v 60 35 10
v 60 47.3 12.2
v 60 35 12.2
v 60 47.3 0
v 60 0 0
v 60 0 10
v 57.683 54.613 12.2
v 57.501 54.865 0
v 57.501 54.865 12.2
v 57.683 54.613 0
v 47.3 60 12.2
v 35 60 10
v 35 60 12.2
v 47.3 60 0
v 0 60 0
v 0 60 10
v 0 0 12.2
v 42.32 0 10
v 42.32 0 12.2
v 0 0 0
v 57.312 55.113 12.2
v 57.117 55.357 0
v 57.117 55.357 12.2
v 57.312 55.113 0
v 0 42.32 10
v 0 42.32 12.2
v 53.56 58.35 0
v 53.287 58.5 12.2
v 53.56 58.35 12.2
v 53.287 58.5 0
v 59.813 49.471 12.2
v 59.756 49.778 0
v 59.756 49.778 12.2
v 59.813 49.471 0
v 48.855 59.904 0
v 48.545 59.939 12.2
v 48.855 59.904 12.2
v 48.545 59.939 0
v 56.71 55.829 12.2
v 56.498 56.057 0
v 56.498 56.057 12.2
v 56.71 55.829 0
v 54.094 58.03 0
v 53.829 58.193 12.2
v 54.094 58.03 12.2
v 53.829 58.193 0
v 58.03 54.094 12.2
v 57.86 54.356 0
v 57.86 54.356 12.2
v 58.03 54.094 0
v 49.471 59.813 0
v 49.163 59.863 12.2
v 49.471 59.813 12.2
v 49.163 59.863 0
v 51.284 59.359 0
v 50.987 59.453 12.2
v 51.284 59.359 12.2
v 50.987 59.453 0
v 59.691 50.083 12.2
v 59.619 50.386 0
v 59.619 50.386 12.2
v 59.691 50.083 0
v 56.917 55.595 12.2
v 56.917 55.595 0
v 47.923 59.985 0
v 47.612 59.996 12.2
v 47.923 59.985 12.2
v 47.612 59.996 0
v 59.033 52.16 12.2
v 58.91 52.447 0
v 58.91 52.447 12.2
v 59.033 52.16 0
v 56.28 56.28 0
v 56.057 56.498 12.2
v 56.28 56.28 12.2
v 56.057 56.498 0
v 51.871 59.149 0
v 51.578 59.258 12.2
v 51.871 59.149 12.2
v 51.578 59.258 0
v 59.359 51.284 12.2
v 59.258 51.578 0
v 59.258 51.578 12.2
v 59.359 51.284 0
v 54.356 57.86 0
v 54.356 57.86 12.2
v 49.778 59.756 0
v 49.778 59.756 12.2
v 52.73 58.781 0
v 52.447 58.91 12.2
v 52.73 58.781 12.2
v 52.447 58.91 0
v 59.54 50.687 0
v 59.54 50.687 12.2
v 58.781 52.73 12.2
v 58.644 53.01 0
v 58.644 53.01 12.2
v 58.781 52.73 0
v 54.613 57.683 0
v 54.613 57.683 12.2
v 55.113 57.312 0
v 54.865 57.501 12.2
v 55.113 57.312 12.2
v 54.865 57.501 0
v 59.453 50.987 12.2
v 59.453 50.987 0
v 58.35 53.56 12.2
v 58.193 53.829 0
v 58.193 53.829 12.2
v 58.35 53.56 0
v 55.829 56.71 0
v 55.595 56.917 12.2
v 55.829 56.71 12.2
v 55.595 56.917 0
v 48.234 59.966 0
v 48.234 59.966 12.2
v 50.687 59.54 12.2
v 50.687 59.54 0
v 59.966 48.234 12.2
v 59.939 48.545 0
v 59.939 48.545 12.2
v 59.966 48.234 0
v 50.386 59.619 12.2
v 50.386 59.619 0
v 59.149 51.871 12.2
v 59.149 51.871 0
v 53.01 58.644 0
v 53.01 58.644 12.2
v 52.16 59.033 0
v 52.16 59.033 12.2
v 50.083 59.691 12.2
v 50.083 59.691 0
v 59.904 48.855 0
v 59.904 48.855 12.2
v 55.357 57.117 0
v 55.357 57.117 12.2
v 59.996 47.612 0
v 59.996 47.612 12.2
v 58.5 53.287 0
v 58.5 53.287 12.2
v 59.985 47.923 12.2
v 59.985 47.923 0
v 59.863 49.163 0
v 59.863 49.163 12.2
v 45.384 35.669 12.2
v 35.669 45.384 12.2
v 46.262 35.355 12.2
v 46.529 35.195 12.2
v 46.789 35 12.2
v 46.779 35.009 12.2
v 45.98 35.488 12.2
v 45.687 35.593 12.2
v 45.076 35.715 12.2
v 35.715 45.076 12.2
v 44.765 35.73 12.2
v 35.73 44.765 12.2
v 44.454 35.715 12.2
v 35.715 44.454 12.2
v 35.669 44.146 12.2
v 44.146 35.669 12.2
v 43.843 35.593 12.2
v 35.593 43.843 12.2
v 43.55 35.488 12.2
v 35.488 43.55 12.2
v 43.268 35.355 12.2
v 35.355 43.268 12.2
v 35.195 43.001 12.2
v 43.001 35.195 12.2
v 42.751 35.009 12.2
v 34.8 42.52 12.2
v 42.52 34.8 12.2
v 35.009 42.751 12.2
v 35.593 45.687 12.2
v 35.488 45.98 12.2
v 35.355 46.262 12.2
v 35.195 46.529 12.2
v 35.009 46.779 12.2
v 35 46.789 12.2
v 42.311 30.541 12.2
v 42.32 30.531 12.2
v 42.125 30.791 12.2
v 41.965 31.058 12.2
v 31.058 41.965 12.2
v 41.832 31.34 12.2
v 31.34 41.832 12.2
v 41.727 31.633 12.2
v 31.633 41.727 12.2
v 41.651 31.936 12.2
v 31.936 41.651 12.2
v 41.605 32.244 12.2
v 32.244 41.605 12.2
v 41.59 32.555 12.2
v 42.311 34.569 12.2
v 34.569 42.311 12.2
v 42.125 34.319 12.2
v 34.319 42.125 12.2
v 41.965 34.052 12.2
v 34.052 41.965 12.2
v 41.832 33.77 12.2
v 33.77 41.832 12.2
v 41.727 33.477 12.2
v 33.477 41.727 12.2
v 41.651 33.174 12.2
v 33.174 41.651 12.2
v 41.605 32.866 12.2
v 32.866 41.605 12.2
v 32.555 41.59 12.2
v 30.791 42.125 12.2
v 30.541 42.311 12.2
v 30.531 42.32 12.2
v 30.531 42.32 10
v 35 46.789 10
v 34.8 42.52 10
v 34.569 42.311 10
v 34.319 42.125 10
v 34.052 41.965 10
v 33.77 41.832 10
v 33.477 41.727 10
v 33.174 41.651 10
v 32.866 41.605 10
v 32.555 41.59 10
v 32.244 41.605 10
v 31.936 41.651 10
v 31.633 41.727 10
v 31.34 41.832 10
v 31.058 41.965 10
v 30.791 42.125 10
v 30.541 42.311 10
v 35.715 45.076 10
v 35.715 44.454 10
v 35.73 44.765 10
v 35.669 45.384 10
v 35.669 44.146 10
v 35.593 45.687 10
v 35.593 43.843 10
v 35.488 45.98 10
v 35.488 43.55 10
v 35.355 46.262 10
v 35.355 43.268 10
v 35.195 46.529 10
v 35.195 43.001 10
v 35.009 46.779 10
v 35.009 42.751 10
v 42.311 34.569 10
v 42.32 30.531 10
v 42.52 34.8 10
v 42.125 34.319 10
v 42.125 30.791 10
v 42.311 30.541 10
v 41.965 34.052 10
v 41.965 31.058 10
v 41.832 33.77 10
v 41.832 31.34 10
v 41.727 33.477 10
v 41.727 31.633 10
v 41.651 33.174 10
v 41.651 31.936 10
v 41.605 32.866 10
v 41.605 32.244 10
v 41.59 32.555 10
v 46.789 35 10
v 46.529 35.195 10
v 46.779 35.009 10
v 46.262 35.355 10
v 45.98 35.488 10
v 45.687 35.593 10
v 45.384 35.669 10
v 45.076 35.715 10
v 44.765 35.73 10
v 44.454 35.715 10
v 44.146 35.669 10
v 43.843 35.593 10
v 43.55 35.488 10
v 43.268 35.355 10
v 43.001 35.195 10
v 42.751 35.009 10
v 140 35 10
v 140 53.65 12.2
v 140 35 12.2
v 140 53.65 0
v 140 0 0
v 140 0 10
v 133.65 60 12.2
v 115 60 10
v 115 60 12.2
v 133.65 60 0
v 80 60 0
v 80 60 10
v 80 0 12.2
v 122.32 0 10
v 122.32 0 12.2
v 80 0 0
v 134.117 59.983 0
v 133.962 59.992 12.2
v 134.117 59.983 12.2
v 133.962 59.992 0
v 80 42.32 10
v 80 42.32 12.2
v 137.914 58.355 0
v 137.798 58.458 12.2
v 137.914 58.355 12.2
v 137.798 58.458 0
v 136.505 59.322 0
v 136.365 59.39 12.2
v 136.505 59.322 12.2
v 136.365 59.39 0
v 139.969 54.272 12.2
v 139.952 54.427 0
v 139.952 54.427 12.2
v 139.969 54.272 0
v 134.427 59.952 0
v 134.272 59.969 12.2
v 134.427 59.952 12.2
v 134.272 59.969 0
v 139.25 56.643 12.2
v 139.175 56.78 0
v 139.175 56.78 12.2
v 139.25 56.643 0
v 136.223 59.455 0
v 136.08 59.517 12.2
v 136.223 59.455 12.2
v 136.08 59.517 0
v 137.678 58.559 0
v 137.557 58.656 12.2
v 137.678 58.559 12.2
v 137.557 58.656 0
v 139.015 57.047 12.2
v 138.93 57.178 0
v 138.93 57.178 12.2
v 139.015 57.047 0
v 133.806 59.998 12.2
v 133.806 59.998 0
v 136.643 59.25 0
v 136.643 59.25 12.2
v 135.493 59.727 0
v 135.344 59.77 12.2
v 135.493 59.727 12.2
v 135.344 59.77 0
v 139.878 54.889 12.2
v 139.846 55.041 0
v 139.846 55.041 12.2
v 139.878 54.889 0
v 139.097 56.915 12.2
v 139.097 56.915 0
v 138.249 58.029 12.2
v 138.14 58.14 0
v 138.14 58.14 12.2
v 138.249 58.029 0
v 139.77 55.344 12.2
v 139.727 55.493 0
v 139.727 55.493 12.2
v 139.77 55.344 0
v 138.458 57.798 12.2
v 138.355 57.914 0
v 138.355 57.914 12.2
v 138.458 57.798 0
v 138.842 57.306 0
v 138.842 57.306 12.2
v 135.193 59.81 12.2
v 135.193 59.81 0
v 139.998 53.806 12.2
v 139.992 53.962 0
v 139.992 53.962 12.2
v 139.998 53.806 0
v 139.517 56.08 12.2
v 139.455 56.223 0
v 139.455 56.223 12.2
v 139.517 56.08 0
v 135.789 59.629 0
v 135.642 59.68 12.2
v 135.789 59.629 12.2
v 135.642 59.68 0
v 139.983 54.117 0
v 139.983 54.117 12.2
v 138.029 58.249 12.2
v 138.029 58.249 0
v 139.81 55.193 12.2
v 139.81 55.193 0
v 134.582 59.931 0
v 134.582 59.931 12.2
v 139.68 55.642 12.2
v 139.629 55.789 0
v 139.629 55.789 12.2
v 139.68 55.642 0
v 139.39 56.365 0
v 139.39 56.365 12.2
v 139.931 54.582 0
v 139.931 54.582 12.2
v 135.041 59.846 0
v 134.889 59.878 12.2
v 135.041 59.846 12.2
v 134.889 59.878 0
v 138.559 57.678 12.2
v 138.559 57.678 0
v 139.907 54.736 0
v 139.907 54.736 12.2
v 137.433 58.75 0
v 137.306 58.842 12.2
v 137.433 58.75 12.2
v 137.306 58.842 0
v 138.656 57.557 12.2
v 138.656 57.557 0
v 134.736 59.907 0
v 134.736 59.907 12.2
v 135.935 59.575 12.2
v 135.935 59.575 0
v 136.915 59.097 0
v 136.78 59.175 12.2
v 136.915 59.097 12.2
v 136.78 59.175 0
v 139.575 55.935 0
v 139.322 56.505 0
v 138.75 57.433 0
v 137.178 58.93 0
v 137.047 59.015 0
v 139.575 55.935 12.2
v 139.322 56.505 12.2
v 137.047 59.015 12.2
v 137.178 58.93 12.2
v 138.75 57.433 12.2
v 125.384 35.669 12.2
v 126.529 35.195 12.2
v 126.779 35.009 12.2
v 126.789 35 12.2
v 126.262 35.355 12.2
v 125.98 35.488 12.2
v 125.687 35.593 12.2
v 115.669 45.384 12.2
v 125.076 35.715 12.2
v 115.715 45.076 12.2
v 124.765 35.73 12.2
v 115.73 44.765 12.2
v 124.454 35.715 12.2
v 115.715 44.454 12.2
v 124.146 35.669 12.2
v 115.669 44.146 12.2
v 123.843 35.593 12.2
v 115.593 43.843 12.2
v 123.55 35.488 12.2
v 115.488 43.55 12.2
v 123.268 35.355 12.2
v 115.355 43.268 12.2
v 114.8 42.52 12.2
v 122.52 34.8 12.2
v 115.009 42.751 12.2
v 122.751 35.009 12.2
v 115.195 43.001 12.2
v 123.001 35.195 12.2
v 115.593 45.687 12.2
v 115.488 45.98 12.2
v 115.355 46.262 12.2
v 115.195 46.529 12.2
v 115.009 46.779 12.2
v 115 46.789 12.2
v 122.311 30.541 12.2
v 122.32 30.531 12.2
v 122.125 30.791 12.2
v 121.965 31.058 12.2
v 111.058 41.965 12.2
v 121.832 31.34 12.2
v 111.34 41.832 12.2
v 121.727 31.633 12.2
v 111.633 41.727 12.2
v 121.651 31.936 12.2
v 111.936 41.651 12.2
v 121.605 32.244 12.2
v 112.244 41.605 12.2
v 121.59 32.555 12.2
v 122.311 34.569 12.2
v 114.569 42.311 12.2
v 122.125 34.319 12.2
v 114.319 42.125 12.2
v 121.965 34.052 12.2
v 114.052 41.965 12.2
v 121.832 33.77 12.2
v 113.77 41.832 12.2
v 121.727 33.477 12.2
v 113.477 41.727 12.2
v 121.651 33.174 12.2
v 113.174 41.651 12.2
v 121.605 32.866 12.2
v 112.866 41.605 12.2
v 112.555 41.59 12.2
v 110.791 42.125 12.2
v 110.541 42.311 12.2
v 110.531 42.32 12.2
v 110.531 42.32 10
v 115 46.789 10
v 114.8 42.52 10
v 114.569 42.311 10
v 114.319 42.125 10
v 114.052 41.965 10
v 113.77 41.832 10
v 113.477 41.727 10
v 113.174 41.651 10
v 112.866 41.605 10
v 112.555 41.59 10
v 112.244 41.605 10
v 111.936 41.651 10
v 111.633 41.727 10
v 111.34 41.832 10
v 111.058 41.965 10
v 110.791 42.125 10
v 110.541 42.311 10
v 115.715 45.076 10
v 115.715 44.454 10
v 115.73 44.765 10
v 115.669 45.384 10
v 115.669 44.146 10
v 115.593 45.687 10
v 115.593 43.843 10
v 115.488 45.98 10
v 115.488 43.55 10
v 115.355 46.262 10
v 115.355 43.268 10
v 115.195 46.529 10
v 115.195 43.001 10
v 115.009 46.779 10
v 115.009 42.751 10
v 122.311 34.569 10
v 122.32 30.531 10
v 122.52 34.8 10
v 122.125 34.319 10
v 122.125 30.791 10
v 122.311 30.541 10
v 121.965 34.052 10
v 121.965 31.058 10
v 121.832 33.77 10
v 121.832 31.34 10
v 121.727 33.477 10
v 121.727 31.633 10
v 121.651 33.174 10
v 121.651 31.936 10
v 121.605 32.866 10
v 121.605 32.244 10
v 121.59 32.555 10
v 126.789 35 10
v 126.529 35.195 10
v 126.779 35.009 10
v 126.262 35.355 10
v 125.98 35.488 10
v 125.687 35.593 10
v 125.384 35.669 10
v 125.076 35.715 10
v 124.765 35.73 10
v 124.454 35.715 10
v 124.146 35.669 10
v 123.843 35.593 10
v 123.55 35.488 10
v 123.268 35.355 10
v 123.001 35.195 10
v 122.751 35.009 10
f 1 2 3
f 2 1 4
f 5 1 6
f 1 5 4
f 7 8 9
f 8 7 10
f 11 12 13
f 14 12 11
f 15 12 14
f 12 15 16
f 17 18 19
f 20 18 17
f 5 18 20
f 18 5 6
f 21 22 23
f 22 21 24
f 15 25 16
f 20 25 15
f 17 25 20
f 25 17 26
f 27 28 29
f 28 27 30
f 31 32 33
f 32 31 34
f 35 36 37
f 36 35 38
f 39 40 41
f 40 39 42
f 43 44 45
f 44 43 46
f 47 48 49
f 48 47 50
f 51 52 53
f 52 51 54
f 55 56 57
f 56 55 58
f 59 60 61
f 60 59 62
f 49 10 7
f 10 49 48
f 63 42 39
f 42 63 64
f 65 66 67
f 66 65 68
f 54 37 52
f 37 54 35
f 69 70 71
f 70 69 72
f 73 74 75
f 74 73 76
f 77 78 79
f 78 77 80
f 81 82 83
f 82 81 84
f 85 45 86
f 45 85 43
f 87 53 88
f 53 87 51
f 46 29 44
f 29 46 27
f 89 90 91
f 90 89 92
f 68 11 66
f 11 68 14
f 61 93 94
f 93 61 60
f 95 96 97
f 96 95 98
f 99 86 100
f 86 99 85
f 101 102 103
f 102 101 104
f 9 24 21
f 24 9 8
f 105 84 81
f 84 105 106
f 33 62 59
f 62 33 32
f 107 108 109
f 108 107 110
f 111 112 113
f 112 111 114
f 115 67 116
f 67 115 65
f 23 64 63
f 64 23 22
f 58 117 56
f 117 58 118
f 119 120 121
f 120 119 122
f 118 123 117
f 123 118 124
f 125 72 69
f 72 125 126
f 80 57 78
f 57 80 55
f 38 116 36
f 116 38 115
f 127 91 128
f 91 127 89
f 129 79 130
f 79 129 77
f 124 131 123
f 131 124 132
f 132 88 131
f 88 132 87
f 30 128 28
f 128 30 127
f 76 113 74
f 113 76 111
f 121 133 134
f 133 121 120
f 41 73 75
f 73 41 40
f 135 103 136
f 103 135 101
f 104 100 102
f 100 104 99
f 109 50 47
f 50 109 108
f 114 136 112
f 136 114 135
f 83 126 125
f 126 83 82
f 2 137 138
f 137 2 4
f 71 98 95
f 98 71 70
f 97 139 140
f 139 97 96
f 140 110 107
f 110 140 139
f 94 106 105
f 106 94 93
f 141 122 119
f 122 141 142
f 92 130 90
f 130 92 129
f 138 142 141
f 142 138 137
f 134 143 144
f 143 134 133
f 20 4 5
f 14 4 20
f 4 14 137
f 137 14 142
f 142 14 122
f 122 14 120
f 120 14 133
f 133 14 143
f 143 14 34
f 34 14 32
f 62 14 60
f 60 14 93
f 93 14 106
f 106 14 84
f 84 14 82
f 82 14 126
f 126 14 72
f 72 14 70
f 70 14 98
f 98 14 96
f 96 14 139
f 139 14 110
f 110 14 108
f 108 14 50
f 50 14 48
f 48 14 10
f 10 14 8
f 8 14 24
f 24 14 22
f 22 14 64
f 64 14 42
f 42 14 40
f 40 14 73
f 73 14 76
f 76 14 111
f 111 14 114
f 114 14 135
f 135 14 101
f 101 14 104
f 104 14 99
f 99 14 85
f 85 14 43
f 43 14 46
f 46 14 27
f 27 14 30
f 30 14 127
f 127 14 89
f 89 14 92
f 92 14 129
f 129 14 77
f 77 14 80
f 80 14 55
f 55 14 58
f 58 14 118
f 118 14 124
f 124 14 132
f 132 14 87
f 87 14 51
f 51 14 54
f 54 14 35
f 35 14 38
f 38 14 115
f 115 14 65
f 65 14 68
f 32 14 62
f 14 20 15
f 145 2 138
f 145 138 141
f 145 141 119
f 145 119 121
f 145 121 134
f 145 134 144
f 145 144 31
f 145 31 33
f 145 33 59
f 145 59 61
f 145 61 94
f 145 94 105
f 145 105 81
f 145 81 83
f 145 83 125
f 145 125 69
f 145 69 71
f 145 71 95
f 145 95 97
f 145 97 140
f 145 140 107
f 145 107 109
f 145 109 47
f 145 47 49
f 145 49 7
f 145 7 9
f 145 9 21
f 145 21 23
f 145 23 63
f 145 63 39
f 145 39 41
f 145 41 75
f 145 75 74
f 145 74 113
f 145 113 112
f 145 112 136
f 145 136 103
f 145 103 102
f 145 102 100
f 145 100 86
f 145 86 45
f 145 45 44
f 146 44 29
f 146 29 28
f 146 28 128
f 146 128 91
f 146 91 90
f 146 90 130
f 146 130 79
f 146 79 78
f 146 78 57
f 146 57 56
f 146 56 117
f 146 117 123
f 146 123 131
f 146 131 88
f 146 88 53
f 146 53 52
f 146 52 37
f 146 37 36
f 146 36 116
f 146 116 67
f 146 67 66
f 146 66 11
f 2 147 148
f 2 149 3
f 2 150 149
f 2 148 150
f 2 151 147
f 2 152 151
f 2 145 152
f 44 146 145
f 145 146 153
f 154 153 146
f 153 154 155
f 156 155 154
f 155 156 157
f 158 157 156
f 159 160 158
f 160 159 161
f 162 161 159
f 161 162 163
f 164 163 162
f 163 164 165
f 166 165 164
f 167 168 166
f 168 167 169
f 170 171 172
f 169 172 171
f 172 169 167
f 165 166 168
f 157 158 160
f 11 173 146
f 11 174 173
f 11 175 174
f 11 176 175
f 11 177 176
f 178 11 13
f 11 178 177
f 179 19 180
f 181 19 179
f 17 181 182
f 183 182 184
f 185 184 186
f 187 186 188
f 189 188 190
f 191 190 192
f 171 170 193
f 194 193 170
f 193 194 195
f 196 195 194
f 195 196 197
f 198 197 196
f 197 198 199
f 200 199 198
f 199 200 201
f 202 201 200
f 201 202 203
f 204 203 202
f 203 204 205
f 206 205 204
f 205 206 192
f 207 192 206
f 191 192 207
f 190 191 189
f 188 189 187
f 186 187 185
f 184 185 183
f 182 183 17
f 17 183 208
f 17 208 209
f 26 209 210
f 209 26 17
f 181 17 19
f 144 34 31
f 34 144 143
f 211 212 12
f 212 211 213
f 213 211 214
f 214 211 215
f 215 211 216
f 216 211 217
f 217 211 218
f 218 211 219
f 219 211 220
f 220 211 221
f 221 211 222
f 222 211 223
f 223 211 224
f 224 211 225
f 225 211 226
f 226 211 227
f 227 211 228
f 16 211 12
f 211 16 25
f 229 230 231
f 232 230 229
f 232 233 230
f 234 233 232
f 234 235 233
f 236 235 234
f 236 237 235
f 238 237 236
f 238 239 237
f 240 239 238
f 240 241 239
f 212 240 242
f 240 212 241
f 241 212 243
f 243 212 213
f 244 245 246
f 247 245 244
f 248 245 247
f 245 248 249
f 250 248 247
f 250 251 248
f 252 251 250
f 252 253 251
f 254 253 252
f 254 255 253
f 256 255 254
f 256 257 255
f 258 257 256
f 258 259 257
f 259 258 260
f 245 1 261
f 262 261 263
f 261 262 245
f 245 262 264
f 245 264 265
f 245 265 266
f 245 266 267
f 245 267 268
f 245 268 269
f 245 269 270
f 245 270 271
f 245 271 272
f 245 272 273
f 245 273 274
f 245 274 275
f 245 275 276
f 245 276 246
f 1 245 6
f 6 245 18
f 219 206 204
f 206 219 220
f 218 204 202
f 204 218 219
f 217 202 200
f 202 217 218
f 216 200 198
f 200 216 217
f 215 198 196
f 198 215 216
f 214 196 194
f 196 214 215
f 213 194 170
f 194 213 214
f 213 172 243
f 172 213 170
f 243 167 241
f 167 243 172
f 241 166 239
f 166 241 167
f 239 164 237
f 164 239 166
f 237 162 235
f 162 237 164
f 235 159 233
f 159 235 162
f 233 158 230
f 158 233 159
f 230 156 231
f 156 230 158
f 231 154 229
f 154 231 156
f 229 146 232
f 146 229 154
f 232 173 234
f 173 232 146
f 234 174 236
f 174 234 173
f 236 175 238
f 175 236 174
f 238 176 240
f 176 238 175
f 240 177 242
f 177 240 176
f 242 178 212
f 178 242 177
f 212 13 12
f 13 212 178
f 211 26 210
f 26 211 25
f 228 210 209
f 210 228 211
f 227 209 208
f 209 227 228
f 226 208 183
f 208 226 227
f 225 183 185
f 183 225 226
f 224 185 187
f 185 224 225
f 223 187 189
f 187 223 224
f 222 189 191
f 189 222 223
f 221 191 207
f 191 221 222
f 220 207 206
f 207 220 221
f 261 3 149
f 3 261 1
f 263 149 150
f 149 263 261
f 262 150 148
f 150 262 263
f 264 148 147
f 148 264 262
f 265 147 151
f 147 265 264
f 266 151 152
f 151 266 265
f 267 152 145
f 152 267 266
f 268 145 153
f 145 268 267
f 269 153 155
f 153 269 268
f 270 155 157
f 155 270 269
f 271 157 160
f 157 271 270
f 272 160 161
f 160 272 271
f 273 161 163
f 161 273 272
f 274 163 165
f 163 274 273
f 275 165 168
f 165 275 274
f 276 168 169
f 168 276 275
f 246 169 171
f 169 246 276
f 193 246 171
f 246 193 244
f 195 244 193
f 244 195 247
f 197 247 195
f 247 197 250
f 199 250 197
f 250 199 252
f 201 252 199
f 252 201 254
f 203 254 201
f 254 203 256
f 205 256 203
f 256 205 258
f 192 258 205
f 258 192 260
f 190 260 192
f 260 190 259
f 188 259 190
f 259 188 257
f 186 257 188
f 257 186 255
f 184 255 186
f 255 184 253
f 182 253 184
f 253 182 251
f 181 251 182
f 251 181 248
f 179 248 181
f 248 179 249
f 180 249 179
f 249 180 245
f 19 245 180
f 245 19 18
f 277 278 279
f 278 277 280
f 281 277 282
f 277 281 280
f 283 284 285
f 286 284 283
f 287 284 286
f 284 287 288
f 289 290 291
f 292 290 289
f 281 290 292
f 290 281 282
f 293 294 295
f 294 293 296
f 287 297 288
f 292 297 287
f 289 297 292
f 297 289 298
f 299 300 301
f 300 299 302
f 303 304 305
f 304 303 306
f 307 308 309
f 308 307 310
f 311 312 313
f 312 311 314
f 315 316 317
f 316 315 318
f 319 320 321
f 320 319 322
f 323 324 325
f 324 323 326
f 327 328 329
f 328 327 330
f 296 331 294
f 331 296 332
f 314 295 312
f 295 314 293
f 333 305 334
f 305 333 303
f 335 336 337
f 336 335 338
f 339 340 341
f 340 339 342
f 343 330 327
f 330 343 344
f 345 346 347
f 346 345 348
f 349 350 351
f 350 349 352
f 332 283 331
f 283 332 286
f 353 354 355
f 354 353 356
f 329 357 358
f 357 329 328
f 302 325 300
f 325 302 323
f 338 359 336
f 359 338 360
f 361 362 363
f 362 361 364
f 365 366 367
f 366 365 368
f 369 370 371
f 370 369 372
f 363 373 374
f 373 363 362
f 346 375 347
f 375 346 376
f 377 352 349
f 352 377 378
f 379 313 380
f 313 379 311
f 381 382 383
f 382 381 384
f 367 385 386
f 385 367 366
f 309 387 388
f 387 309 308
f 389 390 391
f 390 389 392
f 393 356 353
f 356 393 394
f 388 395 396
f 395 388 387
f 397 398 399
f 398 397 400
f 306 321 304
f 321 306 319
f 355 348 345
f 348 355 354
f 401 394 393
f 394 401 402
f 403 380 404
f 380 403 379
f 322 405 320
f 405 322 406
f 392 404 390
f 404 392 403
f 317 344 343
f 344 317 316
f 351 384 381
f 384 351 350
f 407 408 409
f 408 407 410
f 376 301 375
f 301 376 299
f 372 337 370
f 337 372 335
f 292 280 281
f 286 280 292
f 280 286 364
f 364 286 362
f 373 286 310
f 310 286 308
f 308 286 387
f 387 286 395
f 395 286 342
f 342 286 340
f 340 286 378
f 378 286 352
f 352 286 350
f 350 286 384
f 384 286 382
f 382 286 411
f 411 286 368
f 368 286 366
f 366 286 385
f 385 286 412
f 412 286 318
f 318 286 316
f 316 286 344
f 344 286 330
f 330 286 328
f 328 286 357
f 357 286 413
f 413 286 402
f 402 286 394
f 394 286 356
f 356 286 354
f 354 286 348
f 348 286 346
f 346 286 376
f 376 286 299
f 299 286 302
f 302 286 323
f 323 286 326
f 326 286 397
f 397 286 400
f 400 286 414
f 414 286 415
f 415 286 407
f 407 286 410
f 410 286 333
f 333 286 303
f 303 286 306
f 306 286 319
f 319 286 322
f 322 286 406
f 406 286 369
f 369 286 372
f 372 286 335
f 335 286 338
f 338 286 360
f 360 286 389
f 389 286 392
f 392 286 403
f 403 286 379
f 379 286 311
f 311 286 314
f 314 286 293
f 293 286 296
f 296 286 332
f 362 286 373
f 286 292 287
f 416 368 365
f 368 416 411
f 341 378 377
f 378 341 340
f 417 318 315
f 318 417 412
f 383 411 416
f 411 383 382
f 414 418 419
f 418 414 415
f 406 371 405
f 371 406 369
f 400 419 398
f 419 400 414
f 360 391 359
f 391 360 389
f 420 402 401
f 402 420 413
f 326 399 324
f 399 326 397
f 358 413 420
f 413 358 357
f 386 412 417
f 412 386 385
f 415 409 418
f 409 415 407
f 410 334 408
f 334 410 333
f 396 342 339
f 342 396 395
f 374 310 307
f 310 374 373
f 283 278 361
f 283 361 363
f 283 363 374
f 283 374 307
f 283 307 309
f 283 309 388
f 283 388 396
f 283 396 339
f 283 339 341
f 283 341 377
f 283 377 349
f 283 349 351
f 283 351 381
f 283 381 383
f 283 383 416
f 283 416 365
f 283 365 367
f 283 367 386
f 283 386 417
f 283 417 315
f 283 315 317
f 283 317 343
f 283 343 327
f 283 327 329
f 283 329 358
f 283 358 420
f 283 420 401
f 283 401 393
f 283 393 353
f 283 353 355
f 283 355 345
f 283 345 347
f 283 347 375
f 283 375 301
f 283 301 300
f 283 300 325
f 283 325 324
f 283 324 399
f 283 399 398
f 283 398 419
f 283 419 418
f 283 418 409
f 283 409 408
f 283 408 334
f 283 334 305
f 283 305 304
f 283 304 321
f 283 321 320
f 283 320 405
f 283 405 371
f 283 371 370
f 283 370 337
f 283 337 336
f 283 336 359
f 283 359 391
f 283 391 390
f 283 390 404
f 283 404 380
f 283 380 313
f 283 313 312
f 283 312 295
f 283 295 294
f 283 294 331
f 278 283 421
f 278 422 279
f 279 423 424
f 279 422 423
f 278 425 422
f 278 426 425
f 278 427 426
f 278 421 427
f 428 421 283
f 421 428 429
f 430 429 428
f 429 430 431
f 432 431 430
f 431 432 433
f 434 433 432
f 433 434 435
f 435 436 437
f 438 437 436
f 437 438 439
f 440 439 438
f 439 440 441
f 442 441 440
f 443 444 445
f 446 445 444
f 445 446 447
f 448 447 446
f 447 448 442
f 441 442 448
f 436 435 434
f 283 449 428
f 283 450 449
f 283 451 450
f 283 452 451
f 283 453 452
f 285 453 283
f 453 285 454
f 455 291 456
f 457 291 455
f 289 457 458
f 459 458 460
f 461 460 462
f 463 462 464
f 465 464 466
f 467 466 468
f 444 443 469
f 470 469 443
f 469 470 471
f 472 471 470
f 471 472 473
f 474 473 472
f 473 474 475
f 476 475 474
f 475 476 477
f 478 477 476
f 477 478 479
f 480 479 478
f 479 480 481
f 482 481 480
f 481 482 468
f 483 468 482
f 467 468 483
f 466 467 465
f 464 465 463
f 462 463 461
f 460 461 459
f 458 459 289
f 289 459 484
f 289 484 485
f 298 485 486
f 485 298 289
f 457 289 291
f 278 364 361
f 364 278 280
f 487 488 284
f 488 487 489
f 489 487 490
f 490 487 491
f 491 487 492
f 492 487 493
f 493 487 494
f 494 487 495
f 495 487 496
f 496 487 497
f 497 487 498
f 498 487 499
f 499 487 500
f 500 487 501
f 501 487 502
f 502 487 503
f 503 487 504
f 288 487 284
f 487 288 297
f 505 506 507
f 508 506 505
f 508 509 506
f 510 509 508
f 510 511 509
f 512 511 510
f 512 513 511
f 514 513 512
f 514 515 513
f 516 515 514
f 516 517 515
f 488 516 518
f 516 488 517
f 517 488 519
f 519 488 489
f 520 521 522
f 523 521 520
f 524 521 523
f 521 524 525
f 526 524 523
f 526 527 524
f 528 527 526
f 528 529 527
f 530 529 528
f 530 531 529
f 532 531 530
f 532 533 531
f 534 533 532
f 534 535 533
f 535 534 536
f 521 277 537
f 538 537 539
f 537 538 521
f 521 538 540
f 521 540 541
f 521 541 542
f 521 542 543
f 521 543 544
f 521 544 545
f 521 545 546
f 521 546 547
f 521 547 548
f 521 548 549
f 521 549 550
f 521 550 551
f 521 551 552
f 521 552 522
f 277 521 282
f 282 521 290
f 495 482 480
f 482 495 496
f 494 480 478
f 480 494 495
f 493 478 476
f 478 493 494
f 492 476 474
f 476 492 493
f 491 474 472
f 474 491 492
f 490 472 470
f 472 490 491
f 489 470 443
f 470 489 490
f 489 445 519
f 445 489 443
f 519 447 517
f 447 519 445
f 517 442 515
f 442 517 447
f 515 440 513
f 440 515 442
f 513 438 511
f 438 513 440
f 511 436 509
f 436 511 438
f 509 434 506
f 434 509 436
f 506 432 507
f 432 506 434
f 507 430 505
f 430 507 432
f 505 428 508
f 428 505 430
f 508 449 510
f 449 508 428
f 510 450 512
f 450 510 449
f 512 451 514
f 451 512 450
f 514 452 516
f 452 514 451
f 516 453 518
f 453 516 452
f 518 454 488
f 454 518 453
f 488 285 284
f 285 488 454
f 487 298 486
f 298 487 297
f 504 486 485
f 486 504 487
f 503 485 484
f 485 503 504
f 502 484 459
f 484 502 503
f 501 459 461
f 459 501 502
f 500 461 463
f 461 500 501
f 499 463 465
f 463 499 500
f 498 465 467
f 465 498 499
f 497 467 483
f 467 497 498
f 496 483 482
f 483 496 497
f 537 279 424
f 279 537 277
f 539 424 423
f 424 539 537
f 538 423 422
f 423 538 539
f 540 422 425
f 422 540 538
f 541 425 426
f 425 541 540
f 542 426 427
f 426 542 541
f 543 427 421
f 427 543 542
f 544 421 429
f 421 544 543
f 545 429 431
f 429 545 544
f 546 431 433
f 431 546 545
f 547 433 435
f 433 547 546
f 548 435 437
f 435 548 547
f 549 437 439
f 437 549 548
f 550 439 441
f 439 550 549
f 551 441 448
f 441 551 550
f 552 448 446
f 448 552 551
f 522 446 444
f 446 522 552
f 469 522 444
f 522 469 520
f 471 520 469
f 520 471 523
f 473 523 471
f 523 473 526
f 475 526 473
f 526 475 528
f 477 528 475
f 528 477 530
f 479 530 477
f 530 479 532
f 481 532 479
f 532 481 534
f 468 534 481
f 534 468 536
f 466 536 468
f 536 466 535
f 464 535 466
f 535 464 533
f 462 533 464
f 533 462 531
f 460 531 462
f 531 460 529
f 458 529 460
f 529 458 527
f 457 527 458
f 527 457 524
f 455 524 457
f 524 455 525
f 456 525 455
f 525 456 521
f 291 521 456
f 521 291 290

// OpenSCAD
// file: ../../_lib/edge_tabs.scad
include <fillets.scad>;

LEFT_EDGE = 1;
RIGHT_EDGE = 2;
TAB = 3;  // tab defined by left edge and width
CTAB = 4; // tab defined by center and width

// Sample tabs are [[TAB, xpos1, width1], [TAB, xpos2, width2], ...]
// Y origin is bottom.  If you want them centered, offset yourself.
module MiddleSlots(bit, thick, tabs) {
  for(t=tabs) if(t[0] == TAB || t[0] == CTAB)
    translate([GetLeft(t, bit),0]) SpikeBox([t[2],thick], bit);
}

// Y origin is bottom (appropriate for bottom tabs); use 
// the TabsTo* modules to move them to other sides.
module EdgeTabF(bit, thick, tabs) {
  off = sqrt(2) * bit / 4;
  for(t=tabs) if(t[0]==TAB || t[0] == CTAB) {
    translate([GetLeft(t, bit),-bit]) SpikeBox([t[2], thick+bit], bit);
  }
}

function GetLeft(tab, bit) =
  (tab[0] == TAB ? tab[1] :
   (tab[0] == CTAB ? tab[1] - tab[2] / 2 :
    (tab[0] == LEFT_EDGE ? tab[1] - bit :
     (tab[0] == RIGHT_EDGE ? tab[1] + bit : "FAIL"))));

module EdgeTabM(bit, thick, tabs, type=0) {
  for(i=[0:len(tabs)-1]) {
    if(tabs[i][0] == TAB || tabs[i][0] == CTAB) {
      this_right = GetLeft(tabs[i], bit) + tabs[i][2];
      next_left = GetLeft(tabs[i+1], bit);
      translate([this_right, -bit])
        if(type==0) {
          SpikeBox([next_left-this_right, thick+bit], bit);
        } else {
          HBox([next_left-this_right, thick+bit], bit);
        }
    } else if (tabs[i][0] == LEFT_EDGE) {
      this_right = GetLeft(tabs[i], bit);
      next_left = GetLeft(tabs[i+1], bit);
      translate([this_right, -bit])
        if(type==0) {
          SpikeBox([next_left-this_right, thick+bit], bit);
        } else {
          HBox([next_left-this_right, thick+bit], bit);
        }
    }
  }
}

module TabsToLeft(box) {
  scale([-1,1]) rotate([0,0,90]) children();
}

module TabsToRight(box) {
  translate([box[0], 0]) rotate([0,0,90]) children();
}

module TabsToTop(box) {
  translate([0,box[1]]) scale([1,-1]) children();
}
// file: ../../_lib/fillets.scad
module SpikeBox(dims, cutter_dia, center=false, compression_mm=0.2) {
  // This is intentionally tighter than just doing the math; wood compresses.
  // The direction of compression_mm is from each edge, NOT a diagonal.
  // Really it's just a fudge factor.
  off = (sqrt(2) * cutter_dia / 4) + compression_mm;
  translate(center ? [0,0] : [dims[0]/2,dims[1]/2]) {
    hull() for(x_scale=[1,-1], y_scale=[1,-1]) scale([x_scale,y_scale])
      translate([dims[0]/2-off,dims[1]/2-off])
      polygon(points=[[0,0], [off,0], [0,off]], convexity=2);
    // To debug corner intersection...
    // # square(dims, center=true);
    for(x_scale=[1,-1], y_scale=[1,-1]) scale([x_scale,y_scale])
      translate([dims[0]/2-off, dims[1]/2-off])
      circle(d=cutter_dia,$fn=64);
  }
}

module HBox(dims, cutter_dia, center=false, compression_mm=1) {
  translate(center ? [0,0] : [dims[0]/2,dims[1]/2]) {
    xh = dims[0]/2; yh = dims[1]/2;
    hull() for(x_scale=[1,-1], y_scale=[1,-1]) scale([x_scale,y_scale])
      polygon(points=[[0,0], [xh,0], [xh,yh-compression_mm], [xh-cutter_dia/2,yh], [0, yh]]);
    for(x_scale=[1,-1]) scale([x_scale,1])
      translate([dims[0]/2-cutter_dia/2,dims[1]/2-compression_mm])
      circle(d=cutter_dia,$fn=64);
  }
}

// Half spike box, kind of a T shape with circles down and an extra half-bit
// extension upward
module SpikeBoxT(dims, cutter_dia, center=false, compression_mm=0.2) {
  // This is intentionally tighter than just doing the math; wood compresses.
  // The direction of compression_mm is from each edge, NOT a diagonal.
  // Really it's just a fudge factor.
  off = (sqrt(2) * cutter_dia / 4) + compression_mm;
  translate(center ? [0,0] : [dims[0]/2,dims[1]/2]) {
    hull() {
      for(x_scale=[1,-1], y_scale=[-1]) scale([x_scale,y_scale])
        translate([dims[0]/2-off,dims[1]/2-off])
        polygon(points=[[0,0], [off,0], [0,off]], convexity=2);
      polygon(points=[
        [0,0],
        [-dims[0]/2,dims[1]/2+cutter_dia/2],
        [dims[0]/2,dims[1]/2+cutter_dia/2]
      ], convexity=2);
    }
    // To debug corner intersection...
    // # square(dims, center=true);
    for(x_scale=[1,-1], y_scale=[-1]) scale([x_scale,y_scale])
      translate([dims[0]/2-off, dims[1]/2-off])
      circle(d=cutter_dia,$fn=64);
  }
}
// file: corner_lib.scad
include <../../_lib/fillets.scad>;
include <../../_lib/edge_tabs.scad>;

gBitSize = 6.35;
gMaterialThick = 12.2;
gCutDepth = -gMaterialThick - 0.2;
// My angle aluminum is 1.62mm thick, but this lines up with one of the plywood
// layers and causes splintering.  This can be a little deeper...
gPocketDepth = 2.2;
gPocketWidth = 19.3-1.62;

gSquare = 60;
gPocketStart = 25;

// Cammill doesn't support a lead-out, and tends to end at the lower-left; this
// puts the radius at the upper-right so we don't need tabs and it breaks free
// on a non-critical corner.
module Outline(r) {
  hull() {
    translate([gSquare-r,gSquare-r]) circle(r=r,$fn=256);
    difference() {
      square([gSquare,gSquare]);
      translate([gSquare-r,gSquare-r]) square([r,r]);
    }
  }
}

module Pocket() {
  TabsToTop([gSquare,gSquare]) OnePocket();
  TabsToRight([gSquare,gSquare]) OnePocket();
}

module OnePocket() {
  x = gPocketStart;
  w = gSquare - gPocketStart;
  translate([-gBitSize,-gBitSize]) SpikeBox([w+gBitSize,gPocketWidth+gBitSize], gBitSize);
}

module Demo(r=25.4/2) {
  difference() {
    linear_extrude(height=gMaterialThick) Outline(r);
    translate([0,0,gMaterialThick-gPocketDepth])
      linear_extrude(height=gMaterialThick) Pocket();
  }
}
// main file
include <corner_lib.scad>;

Demo(25.4/2);
translate([gSquare+20,0]) Demo(25.4/4);
